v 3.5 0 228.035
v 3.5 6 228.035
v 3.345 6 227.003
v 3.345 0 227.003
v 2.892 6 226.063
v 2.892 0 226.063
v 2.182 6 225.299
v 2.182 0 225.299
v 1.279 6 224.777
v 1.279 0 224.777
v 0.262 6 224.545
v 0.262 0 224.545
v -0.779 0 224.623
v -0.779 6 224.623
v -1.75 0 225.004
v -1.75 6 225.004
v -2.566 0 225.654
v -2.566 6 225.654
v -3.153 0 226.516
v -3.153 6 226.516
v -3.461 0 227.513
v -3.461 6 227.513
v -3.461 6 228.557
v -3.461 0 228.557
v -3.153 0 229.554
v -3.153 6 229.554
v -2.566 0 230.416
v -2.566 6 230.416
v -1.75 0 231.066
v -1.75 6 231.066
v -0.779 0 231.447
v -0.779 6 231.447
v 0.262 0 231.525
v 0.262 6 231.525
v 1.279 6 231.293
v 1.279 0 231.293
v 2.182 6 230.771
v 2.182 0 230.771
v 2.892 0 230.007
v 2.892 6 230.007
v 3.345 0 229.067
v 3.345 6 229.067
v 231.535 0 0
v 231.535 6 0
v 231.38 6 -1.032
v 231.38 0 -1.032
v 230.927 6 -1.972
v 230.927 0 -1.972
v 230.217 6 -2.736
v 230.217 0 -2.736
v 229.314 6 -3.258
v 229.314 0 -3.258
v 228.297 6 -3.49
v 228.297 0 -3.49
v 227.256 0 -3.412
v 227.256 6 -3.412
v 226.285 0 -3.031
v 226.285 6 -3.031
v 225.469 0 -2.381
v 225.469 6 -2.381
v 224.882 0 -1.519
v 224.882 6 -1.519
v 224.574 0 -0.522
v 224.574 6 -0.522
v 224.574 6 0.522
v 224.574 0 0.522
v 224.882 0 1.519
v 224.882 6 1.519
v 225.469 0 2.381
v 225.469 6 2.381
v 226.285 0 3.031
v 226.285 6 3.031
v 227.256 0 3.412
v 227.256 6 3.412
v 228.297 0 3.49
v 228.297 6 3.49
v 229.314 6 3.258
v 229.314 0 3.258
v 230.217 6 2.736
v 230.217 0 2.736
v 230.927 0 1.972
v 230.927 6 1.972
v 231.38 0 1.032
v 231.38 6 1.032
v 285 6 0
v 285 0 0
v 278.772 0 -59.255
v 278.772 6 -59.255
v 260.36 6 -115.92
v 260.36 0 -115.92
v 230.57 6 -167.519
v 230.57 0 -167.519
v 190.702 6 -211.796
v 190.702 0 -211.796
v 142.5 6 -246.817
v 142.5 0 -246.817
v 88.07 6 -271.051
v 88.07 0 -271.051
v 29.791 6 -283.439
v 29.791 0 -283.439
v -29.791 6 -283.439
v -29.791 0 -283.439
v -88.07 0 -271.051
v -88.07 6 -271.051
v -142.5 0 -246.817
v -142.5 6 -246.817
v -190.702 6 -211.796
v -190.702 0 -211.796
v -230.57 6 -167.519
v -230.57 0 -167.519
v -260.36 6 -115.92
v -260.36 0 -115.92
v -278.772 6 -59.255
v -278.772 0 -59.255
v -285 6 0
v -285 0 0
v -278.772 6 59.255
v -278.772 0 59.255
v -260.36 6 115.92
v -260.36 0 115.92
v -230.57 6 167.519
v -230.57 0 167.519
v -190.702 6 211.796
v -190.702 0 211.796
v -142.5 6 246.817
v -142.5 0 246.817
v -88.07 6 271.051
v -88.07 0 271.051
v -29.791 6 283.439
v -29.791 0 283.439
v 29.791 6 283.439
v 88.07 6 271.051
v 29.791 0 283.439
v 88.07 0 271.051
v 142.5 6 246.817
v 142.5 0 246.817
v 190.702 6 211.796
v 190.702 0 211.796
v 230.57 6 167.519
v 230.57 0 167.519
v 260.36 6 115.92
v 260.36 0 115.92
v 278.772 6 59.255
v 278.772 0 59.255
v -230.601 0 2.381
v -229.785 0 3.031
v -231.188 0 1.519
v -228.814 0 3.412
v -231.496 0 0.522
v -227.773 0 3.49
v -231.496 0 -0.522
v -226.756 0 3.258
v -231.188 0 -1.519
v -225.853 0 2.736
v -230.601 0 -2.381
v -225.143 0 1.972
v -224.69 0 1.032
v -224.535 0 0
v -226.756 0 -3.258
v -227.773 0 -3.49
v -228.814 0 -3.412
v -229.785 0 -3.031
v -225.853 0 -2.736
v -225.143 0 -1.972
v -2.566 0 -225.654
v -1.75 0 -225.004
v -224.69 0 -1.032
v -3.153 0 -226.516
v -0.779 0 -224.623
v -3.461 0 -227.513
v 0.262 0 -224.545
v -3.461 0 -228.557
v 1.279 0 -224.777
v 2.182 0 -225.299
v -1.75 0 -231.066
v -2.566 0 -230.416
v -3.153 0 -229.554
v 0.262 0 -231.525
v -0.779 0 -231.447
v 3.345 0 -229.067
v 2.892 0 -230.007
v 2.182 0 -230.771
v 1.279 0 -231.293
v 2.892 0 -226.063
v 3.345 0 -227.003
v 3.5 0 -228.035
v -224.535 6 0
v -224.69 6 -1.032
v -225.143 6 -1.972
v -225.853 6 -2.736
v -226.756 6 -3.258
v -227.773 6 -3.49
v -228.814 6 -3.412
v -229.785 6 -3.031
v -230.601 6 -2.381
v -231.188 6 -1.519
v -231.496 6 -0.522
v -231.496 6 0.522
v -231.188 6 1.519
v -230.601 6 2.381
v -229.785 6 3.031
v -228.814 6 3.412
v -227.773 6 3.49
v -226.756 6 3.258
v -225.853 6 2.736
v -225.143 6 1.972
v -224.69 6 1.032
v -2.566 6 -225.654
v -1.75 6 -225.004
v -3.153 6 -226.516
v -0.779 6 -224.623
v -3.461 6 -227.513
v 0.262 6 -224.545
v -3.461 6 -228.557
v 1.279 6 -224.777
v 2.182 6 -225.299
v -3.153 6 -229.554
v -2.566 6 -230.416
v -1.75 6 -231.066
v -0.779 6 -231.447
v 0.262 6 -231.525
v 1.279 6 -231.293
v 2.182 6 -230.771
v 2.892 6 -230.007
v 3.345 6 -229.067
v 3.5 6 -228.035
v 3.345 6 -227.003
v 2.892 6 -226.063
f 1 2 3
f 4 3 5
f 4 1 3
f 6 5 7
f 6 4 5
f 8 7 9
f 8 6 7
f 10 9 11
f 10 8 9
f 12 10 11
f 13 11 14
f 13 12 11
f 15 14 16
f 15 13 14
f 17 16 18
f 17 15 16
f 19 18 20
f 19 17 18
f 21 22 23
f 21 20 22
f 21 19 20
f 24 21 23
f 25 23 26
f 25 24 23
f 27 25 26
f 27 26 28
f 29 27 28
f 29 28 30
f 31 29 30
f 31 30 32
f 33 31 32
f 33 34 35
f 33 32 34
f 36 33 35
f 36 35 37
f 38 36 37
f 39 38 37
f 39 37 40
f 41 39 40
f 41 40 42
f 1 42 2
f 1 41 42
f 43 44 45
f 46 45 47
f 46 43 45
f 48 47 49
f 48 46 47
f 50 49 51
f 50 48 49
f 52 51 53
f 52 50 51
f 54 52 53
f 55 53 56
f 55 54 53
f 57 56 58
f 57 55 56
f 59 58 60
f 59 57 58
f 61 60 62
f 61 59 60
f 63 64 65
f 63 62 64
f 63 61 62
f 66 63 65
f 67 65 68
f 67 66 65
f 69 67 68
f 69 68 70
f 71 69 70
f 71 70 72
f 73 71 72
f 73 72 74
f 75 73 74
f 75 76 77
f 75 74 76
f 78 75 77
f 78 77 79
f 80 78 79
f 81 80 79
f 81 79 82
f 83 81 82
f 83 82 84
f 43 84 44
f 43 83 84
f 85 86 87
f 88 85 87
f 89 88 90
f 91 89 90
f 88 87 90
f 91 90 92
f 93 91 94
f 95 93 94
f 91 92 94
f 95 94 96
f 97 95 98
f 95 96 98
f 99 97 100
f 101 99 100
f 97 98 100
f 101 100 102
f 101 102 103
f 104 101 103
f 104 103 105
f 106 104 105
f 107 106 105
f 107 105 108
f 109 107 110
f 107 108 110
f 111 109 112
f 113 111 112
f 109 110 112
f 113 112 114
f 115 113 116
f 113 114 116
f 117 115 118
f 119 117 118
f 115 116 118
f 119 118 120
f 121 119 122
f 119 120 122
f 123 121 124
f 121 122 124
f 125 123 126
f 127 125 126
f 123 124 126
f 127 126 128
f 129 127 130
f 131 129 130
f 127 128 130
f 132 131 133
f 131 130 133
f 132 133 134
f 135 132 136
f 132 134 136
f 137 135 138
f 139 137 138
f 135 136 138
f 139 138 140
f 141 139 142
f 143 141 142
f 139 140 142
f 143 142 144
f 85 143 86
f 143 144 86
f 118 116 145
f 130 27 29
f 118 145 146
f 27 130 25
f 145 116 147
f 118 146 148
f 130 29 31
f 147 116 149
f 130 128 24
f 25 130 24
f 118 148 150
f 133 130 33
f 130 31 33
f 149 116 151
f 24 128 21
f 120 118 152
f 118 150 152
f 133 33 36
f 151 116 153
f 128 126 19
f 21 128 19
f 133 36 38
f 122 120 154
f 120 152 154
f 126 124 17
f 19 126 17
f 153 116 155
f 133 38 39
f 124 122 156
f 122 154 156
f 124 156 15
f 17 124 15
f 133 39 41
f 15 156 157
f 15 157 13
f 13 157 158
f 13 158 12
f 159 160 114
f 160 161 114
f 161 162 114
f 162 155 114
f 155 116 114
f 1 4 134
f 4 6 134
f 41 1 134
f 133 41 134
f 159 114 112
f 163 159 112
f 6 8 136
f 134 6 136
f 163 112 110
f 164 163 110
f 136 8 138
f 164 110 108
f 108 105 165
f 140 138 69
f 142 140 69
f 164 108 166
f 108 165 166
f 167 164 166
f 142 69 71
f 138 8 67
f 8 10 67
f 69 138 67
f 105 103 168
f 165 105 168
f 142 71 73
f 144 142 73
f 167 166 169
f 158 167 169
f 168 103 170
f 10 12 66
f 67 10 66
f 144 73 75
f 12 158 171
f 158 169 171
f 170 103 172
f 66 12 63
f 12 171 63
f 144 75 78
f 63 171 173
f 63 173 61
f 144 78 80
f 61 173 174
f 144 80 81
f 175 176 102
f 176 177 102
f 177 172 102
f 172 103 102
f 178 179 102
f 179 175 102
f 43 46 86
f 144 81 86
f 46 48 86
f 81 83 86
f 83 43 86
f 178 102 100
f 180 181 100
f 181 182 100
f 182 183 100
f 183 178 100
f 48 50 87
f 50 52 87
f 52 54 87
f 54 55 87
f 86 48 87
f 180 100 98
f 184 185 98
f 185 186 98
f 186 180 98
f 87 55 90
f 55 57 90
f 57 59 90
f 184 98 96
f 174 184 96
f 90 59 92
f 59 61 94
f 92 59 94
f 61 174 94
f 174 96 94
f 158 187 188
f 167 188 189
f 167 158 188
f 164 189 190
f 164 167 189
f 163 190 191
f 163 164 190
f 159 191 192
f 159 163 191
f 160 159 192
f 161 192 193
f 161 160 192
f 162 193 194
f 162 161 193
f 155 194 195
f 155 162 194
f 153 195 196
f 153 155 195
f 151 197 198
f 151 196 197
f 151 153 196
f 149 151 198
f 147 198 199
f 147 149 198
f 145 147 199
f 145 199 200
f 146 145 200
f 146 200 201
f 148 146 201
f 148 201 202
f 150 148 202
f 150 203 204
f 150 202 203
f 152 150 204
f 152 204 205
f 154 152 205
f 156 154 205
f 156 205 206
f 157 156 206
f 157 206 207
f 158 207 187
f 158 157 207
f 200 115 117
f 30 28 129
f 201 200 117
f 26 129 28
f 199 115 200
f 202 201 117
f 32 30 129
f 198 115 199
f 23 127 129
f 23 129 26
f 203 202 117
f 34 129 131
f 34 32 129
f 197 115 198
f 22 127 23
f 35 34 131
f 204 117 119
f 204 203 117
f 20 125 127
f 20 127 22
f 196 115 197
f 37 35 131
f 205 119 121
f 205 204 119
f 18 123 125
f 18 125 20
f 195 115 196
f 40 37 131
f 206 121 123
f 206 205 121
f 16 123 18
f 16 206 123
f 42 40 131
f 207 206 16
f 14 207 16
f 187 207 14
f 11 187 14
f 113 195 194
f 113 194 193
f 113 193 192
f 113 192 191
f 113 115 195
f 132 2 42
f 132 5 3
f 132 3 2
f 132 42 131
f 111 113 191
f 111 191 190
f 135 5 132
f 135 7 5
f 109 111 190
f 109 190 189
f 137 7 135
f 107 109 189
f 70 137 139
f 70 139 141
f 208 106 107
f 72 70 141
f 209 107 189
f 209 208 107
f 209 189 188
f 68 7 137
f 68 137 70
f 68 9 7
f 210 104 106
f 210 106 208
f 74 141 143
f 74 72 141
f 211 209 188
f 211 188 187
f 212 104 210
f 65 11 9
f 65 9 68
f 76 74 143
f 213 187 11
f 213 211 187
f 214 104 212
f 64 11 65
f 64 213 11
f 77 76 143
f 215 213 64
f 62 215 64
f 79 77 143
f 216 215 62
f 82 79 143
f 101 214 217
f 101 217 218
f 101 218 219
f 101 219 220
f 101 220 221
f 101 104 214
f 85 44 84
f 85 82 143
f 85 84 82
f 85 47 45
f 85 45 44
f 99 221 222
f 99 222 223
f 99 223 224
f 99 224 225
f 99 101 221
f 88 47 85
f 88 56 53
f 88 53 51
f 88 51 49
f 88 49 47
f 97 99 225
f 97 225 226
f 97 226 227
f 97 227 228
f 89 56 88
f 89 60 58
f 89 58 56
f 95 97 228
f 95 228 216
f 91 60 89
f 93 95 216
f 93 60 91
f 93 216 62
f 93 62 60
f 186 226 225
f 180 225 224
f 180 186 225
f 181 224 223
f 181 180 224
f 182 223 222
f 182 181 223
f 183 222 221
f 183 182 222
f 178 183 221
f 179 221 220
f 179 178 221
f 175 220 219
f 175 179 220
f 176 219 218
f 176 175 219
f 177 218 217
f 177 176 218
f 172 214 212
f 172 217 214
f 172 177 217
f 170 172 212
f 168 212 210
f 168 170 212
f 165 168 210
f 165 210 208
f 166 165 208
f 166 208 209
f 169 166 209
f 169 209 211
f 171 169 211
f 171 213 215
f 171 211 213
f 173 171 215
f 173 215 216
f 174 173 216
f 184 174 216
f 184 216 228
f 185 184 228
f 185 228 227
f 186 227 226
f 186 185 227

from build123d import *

# Parameters (mm, degrees)
TAPA_R                  = 285
SALIENTE_EXTRUIR1_DEPTH = 6
CROQUIS2_R              = 3.5
CORTAR_EXTRUIR4_DEPTH   = 7


with BuildPart() as part:
    # Tapa → Saliente-Extruir1 (new body)
    with BuildSketch(Plane(origin=(0, 0, 0), x_dir=(1, 0, 0), z_dir=(0, 1, 0))):
        Circle(TAPA_R)
    extrude(amount=SALIENTE_EXTRUIR1_DEPTH)

    # Croquis2 → Cortar-Extruir4 (cut, through all)
    with BuildSketch(Plane(origin=(0, 0, 0), x_dir=(1, 0, 0), z_dir=(0, 1, 0))):
        with Locations((228.035, 0)):
            Circle(CROQUIS2_R)
        with Locations((0, -228.035)):
            Circle(CROQUIS2_R)
        with Locations((-228.035, 0)):
            Circle(CROQUIS2_R)
        with Locations((0, 228.035)):
            Circle(CROQUIS2_R)
    extrude(amount=CORTAR_EXTRUIR4_DEPTH, mode=Mode.SUBTRACT)


solid = part.part
